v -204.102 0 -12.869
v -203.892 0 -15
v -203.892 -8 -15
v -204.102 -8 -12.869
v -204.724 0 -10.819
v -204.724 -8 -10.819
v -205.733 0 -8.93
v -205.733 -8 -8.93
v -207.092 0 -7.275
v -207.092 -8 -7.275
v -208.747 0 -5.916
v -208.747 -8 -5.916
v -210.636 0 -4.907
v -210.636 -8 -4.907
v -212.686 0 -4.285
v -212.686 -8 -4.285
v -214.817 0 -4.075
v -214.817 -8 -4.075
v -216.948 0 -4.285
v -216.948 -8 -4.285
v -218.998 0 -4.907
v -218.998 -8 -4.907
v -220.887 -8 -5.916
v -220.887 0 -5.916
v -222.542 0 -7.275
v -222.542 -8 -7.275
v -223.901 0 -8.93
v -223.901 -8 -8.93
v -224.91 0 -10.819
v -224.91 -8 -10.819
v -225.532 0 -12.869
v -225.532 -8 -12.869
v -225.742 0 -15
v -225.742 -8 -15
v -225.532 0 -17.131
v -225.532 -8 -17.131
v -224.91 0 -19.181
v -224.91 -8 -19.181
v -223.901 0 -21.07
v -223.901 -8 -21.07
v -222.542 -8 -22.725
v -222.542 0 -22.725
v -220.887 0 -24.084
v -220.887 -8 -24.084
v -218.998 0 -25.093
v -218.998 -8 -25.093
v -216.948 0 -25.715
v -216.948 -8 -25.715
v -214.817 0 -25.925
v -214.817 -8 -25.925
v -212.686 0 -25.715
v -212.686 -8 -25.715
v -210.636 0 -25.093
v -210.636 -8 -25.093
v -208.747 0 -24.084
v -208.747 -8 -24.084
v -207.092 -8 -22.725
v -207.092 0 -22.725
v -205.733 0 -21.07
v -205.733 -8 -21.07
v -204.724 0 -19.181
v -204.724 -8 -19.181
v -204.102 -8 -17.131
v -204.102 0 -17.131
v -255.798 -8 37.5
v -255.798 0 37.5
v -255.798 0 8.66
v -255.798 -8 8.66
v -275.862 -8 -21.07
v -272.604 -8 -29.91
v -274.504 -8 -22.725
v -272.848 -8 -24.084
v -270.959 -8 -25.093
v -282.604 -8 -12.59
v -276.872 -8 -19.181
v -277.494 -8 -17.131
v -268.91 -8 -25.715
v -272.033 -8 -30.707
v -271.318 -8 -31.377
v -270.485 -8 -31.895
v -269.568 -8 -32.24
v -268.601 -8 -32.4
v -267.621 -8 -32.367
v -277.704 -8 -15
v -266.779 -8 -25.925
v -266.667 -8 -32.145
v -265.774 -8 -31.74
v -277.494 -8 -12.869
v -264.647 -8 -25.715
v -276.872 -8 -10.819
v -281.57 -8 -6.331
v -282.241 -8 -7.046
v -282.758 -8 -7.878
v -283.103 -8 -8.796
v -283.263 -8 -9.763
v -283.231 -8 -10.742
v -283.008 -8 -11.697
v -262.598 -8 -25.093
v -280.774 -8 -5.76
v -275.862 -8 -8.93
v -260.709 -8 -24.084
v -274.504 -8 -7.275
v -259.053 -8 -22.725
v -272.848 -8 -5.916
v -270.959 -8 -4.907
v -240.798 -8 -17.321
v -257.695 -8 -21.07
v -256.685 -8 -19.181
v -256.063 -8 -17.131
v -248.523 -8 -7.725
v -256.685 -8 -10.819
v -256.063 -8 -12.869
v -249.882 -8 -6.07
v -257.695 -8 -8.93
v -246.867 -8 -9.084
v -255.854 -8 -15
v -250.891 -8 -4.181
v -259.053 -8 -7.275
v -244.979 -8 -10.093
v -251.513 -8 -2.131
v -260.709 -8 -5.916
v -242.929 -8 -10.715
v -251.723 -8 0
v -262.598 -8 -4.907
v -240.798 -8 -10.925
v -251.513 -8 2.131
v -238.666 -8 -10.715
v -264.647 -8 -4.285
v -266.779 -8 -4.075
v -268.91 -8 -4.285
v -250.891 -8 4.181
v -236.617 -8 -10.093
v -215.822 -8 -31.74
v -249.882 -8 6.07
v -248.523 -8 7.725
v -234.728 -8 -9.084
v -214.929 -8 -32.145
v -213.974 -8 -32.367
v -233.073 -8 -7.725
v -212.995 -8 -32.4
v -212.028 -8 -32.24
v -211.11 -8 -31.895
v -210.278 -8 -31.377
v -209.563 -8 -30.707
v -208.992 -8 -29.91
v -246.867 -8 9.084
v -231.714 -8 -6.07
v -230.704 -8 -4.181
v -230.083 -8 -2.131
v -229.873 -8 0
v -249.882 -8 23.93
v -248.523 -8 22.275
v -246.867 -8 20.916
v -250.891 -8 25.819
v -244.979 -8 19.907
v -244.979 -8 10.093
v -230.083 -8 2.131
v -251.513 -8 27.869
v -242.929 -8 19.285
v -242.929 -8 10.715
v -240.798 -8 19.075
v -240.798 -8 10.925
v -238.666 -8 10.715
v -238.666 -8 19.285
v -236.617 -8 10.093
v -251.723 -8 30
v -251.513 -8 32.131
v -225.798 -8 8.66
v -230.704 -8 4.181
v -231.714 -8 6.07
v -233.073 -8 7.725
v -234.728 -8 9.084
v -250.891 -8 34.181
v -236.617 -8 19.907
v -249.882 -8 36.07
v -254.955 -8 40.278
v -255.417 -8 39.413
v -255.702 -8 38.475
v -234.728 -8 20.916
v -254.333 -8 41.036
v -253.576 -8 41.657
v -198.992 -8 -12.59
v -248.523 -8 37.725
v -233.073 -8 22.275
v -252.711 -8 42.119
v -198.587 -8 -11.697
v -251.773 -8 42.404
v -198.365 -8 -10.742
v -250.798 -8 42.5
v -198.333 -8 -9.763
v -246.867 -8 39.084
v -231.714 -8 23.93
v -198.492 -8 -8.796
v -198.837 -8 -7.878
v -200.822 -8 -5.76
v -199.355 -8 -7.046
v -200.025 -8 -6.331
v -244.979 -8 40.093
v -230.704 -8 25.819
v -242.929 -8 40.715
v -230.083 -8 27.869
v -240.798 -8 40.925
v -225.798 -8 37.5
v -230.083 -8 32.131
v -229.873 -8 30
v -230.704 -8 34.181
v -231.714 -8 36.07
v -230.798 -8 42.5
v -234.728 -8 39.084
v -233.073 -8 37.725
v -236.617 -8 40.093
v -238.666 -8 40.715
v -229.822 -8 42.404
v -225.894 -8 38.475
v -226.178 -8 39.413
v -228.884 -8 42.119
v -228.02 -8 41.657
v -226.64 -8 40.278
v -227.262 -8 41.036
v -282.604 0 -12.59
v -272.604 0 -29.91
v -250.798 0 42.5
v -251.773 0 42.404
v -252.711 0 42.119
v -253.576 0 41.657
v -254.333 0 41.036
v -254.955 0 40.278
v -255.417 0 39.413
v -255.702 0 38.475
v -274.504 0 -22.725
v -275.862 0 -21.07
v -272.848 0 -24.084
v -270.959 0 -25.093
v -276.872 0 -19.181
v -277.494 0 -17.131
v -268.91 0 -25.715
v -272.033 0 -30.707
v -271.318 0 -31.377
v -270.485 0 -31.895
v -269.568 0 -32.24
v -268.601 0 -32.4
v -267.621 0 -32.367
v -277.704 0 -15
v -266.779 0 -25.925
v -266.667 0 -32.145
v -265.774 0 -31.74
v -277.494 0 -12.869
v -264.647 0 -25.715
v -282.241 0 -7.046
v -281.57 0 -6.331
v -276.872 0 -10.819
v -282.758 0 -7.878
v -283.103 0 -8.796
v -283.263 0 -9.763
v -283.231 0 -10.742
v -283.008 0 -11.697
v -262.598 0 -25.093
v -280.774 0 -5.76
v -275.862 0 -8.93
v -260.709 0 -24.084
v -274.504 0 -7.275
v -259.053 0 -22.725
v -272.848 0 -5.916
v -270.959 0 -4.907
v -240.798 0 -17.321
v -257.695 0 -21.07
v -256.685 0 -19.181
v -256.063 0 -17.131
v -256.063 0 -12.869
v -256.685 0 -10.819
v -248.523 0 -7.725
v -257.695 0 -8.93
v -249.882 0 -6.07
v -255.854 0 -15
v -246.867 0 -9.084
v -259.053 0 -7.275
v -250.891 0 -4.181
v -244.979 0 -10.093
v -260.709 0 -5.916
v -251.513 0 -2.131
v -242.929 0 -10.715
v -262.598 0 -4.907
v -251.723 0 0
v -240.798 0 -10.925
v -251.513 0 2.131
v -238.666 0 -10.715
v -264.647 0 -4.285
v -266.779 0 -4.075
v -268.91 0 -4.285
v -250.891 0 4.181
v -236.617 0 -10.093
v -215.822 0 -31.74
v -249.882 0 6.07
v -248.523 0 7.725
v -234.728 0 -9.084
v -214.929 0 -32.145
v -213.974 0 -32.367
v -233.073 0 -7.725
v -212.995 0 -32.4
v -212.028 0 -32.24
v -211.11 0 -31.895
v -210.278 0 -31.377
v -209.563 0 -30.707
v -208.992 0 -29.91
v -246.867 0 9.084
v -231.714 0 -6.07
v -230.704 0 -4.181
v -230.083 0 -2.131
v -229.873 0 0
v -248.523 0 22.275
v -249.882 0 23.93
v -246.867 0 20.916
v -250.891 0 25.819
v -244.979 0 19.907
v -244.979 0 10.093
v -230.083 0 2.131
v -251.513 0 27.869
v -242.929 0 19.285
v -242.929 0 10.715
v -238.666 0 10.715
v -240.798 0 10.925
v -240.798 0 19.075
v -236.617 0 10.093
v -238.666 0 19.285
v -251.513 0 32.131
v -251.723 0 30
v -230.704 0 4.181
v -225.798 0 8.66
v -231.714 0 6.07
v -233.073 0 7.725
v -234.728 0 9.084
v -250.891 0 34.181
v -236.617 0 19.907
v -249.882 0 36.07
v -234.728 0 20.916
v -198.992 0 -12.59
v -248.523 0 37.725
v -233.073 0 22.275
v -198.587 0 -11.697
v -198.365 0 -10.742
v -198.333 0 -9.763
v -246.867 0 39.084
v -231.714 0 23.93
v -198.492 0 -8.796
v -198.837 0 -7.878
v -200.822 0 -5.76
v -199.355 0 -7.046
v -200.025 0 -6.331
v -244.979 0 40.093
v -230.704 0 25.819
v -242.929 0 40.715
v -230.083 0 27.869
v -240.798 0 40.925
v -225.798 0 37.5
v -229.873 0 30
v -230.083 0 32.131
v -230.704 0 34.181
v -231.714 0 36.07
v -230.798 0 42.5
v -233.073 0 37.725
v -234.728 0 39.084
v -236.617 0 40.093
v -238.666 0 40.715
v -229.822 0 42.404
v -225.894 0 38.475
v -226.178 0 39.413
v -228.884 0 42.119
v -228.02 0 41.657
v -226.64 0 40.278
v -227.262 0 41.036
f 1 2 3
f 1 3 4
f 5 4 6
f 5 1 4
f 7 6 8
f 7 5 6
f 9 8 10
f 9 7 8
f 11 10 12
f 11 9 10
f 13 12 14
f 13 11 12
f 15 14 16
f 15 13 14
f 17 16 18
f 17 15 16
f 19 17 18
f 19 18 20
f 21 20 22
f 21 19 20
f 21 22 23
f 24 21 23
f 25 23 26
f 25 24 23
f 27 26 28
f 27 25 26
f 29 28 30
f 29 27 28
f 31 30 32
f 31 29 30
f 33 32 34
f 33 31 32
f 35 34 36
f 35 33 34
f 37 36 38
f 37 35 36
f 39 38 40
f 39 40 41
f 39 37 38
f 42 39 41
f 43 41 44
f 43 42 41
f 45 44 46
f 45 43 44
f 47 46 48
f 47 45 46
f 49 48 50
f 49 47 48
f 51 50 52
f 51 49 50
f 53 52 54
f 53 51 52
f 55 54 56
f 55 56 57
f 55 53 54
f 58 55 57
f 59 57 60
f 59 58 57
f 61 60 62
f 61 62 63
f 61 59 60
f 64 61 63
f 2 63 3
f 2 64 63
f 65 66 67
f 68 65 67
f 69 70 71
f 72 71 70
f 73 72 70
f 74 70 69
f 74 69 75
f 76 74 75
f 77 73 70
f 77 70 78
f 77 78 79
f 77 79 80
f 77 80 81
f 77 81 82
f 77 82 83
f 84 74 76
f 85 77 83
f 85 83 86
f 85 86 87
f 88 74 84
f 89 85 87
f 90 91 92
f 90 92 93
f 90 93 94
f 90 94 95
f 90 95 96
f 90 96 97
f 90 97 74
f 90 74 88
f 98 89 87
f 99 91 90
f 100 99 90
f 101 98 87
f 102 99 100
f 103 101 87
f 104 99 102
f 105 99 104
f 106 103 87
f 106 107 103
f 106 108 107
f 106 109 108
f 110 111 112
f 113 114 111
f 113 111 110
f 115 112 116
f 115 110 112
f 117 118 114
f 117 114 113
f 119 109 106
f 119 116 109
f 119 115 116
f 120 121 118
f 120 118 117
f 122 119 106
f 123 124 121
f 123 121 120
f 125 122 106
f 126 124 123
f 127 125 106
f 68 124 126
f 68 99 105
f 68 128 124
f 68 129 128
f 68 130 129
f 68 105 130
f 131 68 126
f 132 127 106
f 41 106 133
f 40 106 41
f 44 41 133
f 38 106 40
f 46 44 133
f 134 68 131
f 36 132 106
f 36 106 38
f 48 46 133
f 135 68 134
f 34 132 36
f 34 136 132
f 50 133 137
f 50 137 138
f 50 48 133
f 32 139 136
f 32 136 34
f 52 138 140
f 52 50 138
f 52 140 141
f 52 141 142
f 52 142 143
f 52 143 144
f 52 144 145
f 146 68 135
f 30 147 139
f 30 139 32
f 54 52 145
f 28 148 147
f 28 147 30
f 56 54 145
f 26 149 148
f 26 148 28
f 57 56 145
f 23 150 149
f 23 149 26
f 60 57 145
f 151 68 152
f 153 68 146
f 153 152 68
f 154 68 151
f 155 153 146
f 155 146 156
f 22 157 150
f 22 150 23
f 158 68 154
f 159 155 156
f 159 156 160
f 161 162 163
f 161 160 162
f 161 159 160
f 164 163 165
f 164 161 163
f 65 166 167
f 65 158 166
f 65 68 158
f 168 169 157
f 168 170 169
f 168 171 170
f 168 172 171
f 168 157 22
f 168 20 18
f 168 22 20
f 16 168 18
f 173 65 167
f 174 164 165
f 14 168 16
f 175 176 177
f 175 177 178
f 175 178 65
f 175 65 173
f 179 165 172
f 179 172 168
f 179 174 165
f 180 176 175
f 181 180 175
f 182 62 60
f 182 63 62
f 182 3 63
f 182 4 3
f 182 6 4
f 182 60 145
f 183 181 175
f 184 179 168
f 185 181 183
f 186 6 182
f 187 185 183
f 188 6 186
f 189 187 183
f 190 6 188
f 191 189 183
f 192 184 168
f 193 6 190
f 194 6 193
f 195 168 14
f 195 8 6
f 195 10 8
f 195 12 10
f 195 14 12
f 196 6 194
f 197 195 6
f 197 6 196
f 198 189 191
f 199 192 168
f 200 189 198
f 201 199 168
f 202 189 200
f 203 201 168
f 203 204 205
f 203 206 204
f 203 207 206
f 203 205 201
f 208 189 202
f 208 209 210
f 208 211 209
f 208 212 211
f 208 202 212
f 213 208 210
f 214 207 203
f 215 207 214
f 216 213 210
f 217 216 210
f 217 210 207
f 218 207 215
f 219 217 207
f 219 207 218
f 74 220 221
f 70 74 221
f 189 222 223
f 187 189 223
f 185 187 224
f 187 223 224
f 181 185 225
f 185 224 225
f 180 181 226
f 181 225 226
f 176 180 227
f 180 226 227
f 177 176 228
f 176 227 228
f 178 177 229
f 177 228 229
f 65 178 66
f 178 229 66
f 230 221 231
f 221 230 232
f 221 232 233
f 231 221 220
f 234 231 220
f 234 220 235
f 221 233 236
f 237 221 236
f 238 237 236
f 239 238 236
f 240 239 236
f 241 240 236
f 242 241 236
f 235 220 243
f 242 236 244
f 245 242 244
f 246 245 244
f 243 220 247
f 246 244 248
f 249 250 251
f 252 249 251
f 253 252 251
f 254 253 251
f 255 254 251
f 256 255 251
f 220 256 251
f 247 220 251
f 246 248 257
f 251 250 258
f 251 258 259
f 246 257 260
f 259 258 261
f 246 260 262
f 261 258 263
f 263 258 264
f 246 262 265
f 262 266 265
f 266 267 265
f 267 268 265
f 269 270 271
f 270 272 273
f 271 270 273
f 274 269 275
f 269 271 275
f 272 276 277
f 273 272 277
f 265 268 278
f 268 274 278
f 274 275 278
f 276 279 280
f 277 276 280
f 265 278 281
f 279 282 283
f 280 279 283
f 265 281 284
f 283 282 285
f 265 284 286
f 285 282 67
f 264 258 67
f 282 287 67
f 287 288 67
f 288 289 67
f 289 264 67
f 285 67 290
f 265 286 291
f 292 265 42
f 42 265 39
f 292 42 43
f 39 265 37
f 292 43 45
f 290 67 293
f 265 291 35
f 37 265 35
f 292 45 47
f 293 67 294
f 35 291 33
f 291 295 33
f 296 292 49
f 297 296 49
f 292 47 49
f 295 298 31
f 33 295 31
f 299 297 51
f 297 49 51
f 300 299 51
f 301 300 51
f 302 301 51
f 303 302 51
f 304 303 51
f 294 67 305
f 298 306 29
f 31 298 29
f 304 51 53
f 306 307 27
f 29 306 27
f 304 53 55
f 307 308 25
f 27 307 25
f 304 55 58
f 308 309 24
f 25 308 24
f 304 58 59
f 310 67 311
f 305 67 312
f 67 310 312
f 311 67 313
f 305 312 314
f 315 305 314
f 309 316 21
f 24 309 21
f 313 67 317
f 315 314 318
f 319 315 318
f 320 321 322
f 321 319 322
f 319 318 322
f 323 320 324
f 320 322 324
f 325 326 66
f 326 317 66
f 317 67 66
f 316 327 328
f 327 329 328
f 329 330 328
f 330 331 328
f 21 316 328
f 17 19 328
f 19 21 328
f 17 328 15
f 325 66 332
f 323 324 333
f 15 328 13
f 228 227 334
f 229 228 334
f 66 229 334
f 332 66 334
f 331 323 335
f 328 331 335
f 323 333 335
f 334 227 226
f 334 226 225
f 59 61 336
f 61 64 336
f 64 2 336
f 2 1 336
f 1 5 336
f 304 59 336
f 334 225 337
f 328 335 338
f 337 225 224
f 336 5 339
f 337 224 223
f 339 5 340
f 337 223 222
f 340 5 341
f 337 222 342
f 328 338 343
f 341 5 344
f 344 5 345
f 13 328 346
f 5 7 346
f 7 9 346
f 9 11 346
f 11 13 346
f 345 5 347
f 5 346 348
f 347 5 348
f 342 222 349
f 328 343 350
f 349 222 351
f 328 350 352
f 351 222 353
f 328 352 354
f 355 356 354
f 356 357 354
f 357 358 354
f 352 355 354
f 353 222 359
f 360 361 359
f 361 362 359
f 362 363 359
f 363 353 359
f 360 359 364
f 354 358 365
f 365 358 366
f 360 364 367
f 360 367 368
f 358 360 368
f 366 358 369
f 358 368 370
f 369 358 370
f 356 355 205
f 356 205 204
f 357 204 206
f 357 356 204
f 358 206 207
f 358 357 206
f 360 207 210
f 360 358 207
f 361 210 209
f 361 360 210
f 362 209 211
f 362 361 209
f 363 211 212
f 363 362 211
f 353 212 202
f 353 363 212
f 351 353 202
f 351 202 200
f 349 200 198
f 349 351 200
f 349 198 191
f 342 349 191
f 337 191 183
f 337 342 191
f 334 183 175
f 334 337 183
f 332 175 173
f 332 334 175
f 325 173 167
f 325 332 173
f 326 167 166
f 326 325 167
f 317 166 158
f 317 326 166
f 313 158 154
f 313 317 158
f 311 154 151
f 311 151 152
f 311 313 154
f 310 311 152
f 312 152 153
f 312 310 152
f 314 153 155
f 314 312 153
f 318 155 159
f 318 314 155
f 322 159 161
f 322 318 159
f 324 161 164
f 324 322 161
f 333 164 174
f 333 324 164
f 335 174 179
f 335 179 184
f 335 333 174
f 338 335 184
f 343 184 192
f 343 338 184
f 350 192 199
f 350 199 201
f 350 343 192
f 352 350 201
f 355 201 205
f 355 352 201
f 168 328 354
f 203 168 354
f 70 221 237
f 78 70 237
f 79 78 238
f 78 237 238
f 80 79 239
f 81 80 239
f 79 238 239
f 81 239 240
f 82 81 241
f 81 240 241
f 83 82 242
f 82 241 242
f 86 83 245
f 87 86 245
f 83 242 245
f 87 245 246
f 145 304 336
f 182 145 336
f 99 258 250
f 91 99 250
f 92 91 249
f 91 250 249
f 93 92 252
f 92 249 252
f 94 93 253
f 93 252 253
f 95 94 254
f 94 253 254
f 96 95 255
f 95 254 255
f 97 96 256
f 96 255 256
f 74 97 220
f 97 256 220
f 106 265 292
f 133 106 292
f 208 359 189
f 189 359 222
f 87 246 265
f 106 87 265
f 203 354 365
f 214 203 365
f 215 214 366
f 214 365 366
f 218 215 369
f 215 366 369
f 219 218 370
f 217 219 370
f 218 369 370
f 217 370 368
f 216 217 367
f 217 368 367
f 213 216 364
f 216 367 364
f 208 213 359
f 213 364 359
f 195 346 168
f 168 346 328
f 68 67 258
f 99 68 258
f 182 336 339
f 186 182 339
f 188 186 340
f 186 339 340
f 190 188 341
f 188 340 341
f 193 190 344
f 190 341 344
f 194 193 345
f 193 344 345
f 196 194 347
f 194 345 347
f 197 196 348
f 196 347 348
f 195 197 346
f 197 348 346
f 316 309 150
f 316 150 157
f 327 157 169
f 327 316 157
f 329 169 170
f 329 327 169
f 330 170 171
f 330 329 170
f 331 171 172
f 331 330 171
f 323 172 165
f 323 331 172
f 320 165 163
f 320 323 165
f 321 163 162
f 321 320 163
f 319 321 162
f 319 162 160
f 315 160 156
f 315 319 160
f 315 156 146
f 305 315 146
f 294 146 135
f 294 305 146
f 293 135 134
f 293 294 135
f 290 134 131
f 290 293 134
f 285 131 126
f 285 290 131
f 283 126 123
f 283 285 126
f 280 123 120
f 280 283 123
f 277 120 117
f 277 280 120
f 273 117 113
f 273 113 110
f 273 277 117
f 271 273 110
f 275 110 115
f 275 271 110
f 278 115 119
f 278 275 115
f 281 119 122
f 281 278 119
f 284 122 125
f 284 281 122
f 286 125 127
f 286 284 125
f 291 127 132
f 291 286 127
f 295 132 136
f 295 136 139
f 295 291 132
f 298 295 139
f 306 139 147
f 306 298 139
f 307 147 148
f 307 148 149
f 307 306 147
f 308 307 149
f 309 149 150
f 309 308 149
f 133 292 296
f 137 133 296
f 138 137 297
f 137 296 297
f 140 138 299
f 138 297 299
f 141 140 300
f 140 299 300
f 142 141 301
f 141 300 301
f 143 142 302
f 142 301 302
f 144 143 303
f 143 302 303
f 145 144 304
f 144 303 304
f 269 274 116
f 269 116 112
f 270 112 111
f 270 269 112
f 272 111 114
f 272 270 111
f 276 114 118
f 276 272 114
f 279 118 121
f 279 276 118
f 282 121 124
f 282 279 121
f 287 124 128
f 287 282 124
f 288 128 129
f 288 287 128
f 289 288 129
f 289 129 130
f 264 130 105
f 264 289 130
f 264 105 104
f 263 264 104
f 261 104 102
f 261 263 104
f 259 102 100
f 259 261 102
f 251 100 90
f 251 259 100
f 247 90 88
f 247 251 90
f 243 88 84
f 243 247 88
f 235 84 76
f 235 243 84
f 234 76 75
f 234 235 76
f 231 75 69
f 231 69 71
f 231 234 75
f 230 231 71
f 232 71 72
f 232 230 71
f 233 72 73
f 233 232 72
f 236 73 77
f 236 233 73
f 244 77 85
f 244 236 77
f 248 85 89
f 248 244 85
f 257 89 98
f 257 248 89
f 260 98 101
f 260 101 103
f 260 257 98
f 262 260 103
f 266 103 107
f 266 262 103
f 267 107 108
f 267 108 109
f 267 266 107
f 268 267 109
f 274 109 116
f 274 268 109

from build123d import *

# Parameters (mm, degrees)
F0_R     = 10.925
F1_DEPTH = 8


with BuildPart() as f1:
    # F0 (on Front) → F1 (new body)
    with BuildSketch(Plane.XZ):
        with BuildLine():
            Line((-225.7977879047, -8.6602540378), (-225.7977879047, -12.5))
            Line((-225.7977879047, -12.5), (-232.4484229994, -12.5))
            Line((-232.4484229994, -12.5), (-240.7977879047, -17.3205080757))
            Line((-240.7977879047, -17.3205080757), (-215.8218352628, -31.7403810568))
            ThreePointArc((-215.8218352628, -31.7403810568), (-212.0277400373, -32.2398831693), (-208.9917082439, -29.9102540378))
            Line((-208.9917082439, -29.9102540378), (-198.9917082439, -12.5897459622))
            ThreePointArc((-198.9917082439, -12.5897459622), (-198.4922061314, -8.7956507366), (-200.8218352628, -5.7596189432))
            Line((-200.8218352628, -5.7596189432), (-225.7977879047, 8.6602540378))
            Line((-225.7977879047, 8.6602540378), (-225.7977879047, -0.9807621135))
            Line((-225.7977879047, -0.9807621135), (-222.4724703574, -6.7403810568))
            Line((-222.4724703574, -6.7403810568), (-225.7977879047, -8.6602540378))
        make_face()
        with Locations((-214.8170257912, -15)):
            Circle(F0_R, mode=Mode.SUBTRACT)
        Polygon((-240.7977879047, -17.3205080757), (-232.4484229994, -12.5), (-249.1471528101, -12.5), align=None)
        with BuildLine():
            Line((-240.7977879047, -17.3205080757), (-249.1471528101, -12.5))
            Line((-249.1471528101, -12.5), (-255.7977879047, -12.5))
            Line((-255.7977879047, -12.5), (-255.7977879047, -8.6602540378))
            Line((-255.7977879047, -8.6602540378), (-259.123105452, -6.7403810568))
            Line((-259.123105452, -6.7403810568), (-255.7977879047, -0.9807621135))
            Line((-255.7977879047, -0.9807621135), (-255.7977879047, 8.6602540378))
            Line((-255.7977879047, 8.6602540378), (-280.7737405467, -5.7596189432))
            ThreePointArc((-280.7737405467, -5.7596189432), (-283.1033696781, -8.7956507366), (-282.6038675656, -12.5897459622))
            Line((-282.6038675656, -12.5897459622), (-272.6038675656, -29.9102540378))
            ThreePointArc((-272.6038675656, -29.9102540378), (-269.5678357722, -32.2398831693), (-265.7737405467, -31.7403810568))
            Line((-265.7737405467, -31.7403810568), (-240.7977879047, -17.3205080757))
        make_face()
        with Locations((-266.7785500183, -15)):
            Circle(F0_R, mode=Mode.SUBTRACT)
        Polygon((-234.1471528101, 13.4807621135), (-225.7977879047, -0.9807621135), (-225.7977879047, 8.6602540378), align=None)
        with BuildLine():
            Line((-234.1471528101, 13.4807621135), (-225.7977879047, 8.6602540378))
            Line((-225.7977879047, 8.6602540378), (-225.7977879047, 37.5))
            ThreePointArc((-225.7977879047, 37.5), (-227.2622539988, 41.0355339059), (-230.7977879047, 42.5))
            Line((-230.7977879047, 42.5), (-250.7977879047, 42.5))
            ThreePointArc((-250.7977879047, 42.5), (-254.3333218107, 41.0355339059), (-255.7977879047, 37.5))
            Line((-255.7977879047, 37.5), (-255.7977879047, 8.6602540378))
            Line((-255.7977879047, 8.6602540378), (-247.4484229994, 13.4807621135))
            Line((-247.4484229994, 13.4807621135), (-244.123105452, 19.2403810568))
            Line((-244.123105452, 19.2403810568), (-240.7977879047, 17.3205080757))
            Line((-240.7977879047, 17.3205080757), (-237.4724703574, 19.2403810568))
            Line((-237.4724703574, 19.2403810568), (-234.1471528101, 13.4807621135))
        make_face()
        with Locations((-240.7977879047, 30)):
            Circle(F0_R, mode=Mode.SUBTRACT)
        Polygon((-255.7977879047, 8.6602540378), (-255.7977879047, -0.9807621135), (-247.4484229994, 13.4807621135), align=None)
        Polygon((-247.4484229994, 13.4807621135), (-240.7977879047, 17.3205080757), (-244.123105452, 19.2403810568), align=None)
        Polygon((-240.7977879047, 17.3205080757), (-234.1471528101, 13.4807621135), (-237.4724703574, 19.2403810568), align=None)
        Polygon((-249.1471528101, -12.5), (-232.4484229994, -12.5), (-225.7977879047, -8.6602540378), (-225.7977879047, -0.9807621135), (-234.1471528101, 13.4807621135), (-240.7977879047, 17.3205080757), (-247.4484229994, 13.4807621135), (-255.7977879047, -0.9807621135), (-255.7977879047, -8.6602540378), align=None)
        with Locations((-240.7977879047, 0)):
            Circle(F0_R, mode=Mode.SUBTRACT)
        Polygon((-225.7977879047, -0.9807621135), (-225.7977879047, -8.6602540378), (-222.4724703574, -6.7403810568), align=None)
        Polygon((-232.4484229994, -12.5), (-225.7977879047, -12.5), (-225.7977879047, -8.6602540378), align=None)
        Polygon((-255.7977879047, -12.5), (-249.1471528101, -12.5), (-255.7977879047, -8.6602540378), align=None)
        Polygon((-259.123105452, -6.7403810568), (-255.7977879047, -8.6602540378), (-255.7977879047, -0.9807621135), align=None)
    extrude(amount=F1_DEPTH)


solid = f1.part
